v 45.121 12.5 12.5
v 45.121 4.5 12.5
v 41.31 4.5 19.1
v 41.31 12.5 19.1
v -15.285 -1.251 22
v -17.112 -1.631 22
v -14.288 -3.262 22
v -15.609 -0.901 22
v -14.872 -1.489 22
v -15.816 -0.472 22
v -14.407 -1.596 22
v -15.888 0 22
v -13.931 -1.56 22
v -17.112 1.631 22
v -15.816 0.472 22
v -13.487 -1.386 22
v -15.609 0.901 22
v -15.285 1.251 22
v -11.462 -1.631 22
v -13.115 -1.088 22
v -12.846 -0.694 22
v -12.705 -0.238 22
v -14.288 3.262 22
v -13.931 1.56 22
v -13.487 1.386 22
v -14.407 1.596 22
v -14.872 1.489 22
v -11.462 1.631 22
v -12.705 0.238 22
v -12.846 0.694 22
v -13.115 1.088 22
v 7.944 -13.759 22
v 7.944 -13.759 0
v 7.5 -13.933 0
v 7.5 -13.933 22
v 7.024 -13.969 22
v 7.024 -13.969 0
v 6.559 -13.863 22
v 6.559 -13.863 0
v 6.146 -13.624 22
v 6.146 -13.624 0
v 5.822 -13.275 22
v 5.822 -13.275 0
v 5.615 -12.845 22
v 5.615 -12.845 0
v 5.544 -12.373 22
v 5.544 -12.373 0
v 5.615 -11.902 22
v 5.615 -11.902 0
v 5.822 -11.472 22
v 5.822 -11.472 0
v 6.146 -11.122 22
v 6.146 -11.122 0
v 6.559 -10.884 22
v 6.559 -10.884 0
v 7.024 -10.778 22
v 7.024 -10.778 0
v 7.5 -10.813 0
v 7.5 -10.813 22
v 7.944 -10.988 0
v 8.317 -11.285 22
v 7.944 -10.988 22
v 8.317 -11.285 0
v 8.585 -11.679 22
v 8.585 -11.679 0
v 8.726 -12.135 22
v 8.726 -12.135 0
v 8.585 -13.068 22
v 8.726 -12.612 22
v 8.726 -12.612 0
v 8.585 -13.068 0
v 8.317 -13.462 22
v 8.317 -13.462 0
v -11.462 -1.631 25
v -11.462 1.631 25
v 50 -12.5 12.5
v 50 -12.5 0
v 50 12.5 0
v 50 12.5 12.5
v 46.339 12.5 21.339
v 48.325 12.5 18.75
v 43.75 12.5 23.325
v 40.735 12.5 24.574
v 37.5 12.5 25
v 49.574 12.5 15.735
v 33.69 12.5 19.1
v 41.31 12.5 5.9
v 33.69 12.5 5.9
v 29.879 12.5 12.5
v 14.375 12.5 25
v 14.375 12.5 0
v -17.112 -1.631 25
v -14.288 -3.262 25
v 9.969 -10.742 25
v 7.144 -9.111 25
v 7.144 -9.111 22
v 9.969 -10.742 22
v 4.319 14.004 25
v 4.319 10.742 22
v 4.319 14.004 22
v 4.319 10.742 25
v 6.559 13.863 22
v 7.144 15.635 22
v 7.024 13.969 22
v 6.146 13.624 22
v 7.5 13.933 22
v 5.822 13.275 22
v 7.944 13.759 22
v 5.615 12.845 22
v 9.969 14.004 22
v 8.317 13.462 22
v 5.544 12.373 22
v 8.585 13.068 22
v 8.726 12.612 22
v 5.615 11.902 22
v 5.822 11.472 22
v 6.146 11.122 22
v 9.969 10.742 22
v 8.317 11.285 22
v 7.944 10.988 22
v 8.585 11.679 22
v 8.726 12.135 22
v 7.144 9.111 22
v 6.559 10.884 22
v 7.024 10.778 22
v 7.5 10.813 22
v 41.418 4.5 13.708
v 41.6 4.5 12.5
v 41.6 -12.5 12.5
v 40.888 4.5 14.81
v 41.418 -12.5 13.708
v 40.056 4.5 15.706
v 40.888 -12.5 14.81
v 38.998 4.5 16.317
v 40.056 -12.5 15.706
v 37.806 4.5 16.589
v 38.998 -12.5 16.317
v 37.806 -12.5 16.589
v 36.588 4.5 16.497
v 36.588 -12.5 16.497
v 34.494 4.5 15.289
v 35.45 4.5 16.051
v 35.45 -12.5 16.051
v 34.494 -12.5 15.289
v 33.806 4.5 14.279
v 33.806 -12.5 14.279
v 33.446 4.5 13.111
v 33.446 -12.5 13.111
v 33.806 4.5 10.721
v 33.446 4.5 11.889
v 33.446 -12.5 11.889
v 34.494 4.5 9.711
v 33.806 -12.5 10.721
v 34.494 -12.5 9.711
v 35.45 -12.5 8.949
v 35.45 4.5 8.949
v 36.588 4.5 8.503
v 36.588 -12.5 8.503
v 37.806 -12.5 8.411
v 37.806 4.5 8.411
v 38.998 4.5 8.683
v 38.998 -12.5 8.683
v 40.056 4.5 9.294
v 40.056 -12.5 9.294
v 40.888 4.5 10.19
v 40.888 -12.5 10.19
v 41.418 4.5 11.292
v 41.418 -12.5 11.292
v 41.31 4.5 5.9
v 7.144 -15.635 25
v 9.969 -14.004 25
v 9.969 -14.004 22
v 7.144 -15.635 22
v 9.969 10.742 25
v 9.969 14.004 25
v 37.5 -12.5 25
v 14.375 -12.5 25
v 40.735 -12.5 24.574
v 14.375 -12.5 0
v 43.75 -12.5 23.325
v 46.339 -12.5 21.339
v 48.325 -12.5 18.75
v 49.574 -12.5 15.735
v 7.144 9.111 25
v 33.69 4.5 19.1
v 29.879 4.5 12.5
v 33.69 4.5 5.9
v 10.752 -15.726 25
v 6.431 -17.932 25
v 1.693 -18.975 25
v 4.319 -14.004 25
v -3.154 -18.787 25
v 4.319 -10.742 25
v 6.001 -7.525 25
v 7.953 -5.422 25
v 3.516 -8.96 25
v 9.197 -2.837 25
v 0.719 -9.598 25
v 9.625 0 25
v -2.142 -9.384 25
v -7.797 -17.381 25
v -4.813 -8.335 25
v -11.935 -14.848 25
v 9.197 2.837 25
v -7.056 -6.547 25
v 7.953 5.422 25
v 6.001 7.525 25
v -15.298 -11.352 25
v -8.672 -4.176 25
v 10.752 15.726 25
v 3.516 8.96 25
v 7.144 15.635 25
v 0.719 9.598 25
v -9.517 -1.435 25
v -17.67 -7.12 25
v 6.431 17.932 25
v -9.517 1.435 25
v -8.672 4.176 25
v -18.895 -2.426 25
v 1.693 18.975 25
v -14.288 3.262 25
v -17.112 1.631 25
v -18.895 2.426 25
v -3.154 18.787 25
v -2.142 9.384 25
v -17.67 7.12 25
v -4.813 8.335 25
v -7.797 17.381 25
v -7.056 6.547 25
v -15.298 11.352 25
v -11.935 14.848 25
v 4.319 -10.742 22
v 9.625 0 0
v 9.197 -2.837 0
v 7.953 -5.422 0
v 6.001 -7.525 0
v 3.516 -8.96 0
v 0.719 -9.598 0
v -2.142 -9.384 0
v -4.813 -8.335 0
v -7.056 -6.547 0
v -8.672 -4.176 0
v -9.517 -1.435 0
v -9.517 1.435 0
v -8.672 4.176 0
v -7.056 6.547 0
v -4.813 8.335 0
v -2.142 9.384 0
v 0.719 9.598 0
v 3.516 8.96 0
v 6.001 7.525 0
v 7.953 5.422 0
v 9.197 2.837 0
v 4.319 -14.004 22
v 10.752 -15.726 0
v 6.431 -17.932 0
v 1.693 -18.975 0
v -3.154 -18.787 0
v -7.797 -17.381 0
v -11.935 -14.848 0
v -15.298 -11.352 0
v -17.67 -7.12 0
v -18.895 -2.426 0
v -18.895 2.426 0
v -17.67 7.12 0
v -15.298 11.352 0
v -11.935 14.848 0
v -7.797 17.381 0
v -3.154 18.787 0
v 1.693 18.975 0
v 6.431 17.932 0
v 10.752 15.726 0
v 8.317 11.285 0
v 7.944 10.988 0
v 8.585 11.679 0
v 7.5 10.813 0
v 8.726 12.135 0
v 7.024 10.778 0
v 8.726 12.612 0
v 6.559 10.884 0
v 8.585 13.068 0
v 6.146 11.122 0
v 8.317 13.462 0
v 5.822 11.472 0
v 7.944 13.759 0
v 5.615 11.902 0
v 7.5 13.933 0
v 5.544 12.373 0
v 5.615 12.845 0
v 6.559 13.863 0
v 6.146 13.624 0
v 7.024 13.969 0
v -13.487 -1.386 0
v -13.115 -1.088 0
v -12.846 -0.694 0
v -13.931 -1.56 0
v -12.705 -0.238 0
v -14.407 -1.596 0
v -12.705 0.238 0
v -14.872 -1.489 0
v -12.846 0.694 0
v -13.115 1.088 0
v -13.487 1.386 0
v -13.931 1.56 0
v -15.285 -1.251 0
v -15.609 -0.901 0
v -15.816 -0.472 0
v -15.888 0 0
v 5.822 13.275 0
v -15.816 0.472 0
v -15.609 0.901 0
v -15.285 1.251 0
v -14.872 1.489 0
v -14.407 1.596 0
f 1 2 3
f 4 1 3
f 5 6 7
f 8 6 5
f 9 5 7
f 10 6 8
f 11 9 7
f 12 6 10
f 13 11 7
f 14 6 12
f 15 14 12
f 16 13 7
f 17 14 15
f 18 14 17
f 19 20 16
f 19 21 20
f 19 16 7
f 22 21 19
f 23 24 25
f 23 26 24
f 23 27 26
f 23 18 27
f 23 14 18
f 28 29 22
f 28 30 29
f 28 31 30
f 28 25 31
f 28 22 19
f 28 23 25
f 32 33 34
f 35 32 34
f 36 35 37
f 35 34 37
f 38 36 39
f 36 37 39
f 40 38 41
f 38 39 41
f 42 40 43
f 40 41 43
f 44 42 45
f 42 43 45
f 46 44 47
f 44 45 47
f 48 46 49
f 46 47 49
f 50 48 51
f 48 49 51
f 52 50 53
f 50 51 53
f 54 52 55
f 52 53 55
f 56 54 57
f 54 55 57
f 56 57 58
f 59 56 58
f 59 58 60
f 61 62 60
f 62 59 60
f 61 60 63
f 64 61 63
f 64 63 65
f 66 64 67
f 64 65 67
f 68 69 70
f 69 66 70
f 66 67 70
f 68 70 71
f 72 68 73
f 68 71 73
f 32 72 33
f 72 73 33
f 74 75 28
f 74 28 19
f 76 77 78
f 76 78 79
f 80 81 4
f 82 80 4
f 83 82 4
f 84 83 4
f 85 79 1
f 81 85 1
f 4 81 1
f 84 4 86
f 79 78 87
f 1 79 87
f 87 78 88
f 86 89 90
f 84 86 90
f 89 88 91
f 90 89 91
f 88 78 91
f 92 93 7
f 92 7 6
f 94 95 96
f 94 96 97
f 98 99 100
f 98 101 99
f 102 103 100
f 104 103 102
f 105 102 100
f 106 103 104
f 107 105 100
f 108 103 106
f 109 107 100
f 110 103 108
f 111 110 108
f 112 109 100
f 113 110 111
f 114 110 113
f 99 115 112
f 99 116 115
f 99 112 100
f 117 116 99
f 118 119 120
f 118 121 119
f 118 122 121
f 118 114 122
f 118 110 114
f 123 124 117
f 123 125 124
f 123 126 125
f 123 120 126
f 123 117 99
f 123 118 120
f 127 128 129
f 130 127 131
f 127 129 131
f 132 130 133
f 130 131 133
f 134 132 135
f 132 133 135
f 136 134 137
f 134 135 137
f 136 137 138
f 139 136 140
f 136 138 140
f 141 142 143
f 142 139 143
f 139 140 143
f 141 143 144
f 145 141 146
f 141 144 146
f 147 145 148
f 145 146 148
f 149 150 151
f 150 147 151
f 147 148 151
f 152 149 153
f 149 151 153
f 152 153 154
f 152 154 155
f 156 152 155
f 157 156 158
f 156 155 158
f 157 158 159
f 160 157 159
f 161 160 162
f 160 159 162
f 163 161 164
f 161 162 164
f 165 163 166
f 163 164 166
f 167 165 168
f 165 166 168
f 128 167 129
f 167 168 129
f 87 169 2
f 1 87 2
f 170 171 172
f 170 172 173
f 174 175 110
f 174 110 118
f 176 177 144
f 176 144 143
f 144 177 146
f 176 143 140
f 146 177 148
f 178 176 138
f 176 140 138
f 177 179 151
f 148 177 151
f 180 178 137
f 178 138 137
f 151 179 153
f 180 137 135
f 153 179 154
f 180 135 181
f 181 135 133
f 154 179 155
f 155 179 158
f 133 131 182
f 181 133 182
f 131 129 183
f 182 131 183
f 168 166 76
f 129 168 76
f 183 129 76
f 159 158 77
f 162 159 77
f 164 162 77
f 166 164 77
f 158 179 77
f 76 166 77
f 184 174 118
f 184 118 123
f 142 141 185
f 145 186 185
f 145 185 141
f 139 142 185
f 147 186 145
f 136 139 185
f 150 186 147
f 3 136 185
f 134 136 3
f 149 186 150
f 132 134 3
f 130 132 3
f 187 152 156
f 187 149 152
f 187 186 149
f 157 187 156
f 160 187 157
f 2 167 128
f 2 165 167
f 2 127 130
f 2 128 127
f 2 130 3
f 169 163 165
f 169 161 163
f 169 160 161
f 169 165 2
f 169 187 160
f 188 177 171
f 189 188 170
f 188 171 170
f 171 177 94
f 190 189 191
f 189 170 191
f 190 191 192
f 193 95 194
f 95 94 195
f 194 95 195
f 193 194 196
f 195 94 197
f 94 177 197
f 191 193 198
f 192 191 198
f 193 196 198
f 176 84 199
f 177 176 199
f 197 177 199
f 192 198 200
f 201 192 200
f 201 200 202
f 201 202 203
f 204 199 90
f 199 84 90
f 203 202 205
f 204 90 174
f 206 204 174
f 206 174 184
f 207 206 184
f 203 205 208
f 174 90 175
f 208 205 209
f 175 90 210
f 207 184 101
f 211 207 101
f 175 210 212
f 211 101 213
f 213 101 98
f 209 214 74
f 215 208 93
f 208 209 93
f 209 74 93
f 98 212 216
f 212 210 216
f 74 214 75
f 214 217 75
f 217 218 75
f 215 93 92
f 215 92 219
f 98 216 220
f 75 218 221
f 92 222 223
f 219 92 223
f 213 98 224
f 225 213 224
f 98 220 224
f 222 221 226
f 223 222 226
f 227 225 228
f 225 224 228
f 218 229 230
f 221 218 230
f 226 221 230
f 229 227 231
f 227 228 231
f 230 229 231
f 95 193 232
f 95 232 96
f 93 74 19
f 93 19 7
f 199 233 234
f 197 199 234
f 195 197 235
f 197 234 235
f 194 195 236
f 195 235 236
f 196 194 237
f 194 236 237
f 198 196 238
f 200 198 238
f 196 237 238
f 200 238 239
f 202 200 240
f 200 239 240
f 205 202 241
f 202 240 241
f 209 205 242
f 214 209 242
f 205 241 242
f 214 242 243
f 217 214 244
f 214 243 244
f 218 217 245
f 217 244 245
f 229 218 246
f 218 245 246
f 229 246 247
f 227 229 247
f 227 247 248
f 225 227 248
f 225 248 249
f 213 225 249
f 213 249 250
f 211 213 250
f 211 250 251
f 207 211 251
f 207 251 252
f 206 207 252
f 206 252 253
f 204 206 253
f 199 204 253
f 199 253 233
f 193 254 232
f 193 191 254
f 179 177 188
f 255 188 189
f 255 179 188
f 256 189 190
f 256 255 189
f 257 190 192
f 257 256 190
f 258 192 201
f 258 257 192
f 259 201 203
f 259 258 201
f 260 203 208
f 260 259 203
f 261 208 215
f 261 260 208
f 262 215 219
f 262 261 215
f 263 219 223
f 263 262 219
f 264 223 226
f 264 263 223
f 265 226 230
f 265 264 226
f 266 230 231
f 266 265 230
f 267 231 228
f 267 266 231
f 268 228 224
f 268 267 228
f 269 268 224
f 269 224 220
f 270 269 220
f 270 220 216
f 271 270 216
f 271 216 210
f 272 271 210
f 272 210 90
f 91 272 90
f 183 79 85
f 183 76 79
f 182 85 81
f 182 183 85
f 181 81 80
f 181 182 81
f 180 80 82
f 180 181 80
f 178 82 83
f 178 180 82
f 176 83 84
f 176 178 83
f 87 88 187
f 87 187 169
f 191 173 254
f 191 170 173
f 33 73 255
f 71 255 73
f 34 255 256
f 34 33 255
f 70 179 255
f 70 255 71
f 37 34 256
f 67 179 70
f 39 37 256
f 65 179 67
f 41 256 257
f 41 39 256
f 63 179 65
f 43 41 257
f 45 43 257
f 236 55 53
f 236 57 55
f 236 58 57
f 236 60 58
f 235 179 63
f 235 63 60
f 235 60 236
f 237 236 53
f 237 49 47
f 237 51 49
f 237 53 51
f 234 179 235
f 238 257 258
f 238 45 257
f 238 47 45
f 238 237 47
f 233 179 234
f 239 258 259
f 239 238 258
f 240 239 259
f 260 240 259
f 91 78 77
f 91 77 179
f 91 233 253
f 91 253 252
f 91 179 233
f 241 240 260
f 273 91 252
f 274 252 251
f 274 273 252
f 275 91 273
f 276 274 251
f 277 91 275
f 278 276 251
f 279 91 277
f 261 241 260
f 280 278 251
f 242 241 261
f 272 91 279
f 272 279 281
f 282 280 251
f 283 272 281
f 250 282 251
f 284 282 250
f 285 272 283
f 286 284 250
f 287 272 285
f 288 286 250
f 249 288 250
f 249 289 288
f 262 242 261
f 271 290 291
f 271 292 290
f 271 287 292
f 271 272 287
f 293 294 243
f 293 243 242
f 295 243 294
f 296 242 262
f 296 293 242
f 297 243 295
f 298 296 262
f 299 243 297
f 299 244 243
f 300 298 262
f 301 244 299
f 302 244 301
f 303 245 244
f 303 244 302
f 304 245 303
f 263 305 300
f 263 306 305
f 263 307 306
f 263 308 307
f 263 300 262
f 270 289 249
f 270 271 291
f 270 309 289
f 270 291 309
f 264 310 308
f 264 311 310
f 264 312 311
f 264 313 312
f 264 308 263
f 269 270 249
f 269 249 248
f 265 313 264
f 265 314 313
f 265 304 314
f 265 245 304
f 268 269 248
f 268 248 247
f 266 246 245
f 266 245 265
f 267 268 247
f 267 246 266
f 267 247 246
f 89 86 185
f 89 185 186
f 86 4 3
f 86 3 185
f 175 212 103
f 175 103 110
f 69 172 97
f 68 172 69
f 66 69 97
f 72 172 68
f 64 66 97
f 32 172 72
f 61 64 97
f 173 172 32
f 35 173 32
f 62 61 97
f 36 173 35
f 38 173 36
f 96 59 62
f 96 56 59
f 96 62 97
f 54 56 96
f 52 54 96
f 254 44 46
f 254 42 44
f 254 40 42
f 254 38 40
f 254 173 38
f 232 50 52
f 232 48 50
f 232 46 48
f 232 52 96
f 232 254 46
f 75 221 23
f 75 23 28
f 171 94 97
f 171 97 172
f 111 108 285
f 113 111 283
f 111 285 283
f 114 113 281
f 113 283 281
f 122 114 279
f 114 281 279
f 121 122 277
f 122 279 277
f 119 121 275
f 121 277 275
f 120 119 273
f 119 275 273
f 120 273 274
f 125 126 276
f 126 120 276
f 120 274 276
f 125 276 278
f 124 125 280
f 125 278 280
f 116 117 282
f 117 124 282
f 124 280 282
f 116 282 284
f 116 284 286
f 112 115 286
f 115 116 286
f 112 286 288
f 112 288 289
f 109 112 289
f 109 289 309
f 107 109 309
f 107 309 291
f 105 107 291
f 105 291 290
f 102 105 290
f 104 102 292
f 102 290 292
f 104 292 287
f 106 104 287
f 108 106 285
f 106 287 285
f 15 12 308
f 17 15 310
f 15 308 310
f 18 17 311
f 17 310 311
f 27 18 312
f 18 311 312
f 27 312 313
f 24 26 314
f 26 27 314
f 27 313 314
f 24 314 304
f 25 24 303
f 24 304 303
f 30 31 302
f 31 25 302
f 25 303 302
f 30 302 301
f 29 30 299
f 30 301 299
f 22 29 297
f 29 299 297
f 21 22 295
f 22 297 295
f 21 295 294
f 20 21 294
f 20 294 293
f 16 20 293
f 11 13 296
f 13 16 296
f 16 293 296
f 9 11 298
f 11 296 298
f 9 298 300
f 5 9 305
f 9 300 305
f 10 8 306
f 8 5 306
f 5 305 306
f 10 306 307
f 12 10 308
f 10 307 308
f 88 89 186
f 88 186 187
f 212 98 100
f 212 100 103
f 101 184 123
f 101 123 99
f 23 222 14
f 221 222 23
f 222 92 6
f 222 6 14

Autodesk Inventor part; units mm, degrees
ref_plane "YZ Plane" through (0, 0, 0) normal (1, 0, 0) x (0, 1, 0)
ref_plane "XZ Plane" through (0, 0, 0) normal (0, 1, 0) x (-1, 0, 0)
ref_plane "XY Plane" through (0, 0, 0) normal (0, 0, 1) x (1, 0, 0)
sketch "Sketch1" plane through (0, 0, 0) normal (0, 0, 1) x (1, 0, 0)
  circle A0 centre (0, 0) radius 9.625
  arc A1 (0, 12.5) -> (0, -12.5) centre (0, 0) ccw
  line L0 (0, -12.5) -> (37.5, -12.5)
  line L1 (37.5, -12.5) -> (37.5, 12.5)
  line L2 (37.5, 12.5) -> (0, 12.5)
  line L3 (37.5, 0) -> (9.625, 0) construction
  dimension "d0" = 19.25
  dimension "d2" = 25
  dimension "d4" = 37.5
extrude "Extrusion1" add sketch "Sketch1" along normal blind 25
sketch "Sketch2" plane through (0, -12.5, 0) normal (0, -1, 0) x (1, 0, 0)
  line L0 (37.5, 0) -> (37.5, 25) projected
  line L1 (0, 25) -> (37.5, 25) projected
  line L2 (0, 0) -> (0, 25) projected
  line L3 (37.5, 0) -> (50, 0)
  line L4 (50, 0) -> (50, 12.5)
  arc A0 (50, 12.5) -> (37.5, 25) centre (37.5, 12.5) ccw
extrude "Extrusion2" add sketch "Sketch2" against normal up to surface (25 mm away)
sketch "Sketch3" plane through (0, -12.5, 0) normal (0, -1, 0) x (1, 0, 0)
  arc A0 (50, 12.5) -> (37.5, 25) centre (37.5, 12.5) ccw projected
  circle A1 centre (37.5, 12.5) radius 4.1
  dimension "d9" = 8.2
extrude "Extrusion3" cut sketch "Sketch3" against normal through all
sketch "Sketch10" plane through (50, 12.5, 12.5) normal (0, 1, 0) x (1, 0, 0)
  circle A0 centre (-12.5, 0) radius 4.1 projected
  line L0 (-20.121, 0) -> (-16.3105, 6.6)
  line L1 (-16.3105, 6.6) -> (-8.6895, 6.6)
  line L2 (-8.6895, 6.6) -> (-4.879, 0)
  line L3 (-4.879, 0) -> (-8.6895, -6.6)
  line L4 (-8.6895, -6.6) -> (-16.3105, -6.6)
  line L5 (-16.3105, -6.6) -> (-20.121, 0)
  point P0 (-50, 12.5)
  point P1 (-12.5, 6.6)
  dimension "d47" = 13.2
extrude "Extrusion10" cut sketch "Sketch10" against normal blind 8
sketch "Sketch11" plane through (0, 0, 0) normal (0, 0, -1) x (-1, 0, 0)
  circle A0 centre (0, 0) radius 9.625 projected
  arc A1 (0, -12.5) -> (0, 12.5) centre (0, 0) ccw projected
  circle A2 centre (0, 0) radius 19.05
  dimension "d50" = 38.1
extrude "Extrusion11" add sketch "Sketch11" against normal up to surface (25 mm away)
sketch "Sketch12" plane through (0, 0, 0) normal (0, 0, -1) x (-1, 0, 0)
  arc A0 (-14.3754, -12.5) -> (-14.3754, 12.5) centre (0, 0) ccw projected
  circle A1 centre (14.2875, 0) radius 1.6
  dimension "d55" = 14.2875
  dimension "d56" = 3.2
extrude "Extrusion12" cut sketch "Sketch12" against normal through all
sketch "Sketch13" plane through (0, 0, 25) normal (0, 0, 1) x (1, 0, 0)
  circle A0 centre (-14.2875, 0) radius 1.6 projected
  line L0 (-14.2875, 3.262) -> (-11.4625, 1.631)
  line L1 (-11.4625, 1.631) -> (-11.4625, -1.631)
  line L2 (-11.4625, -1.631) -> (-14.2875, -3.262)
  line L3 (-14.2875, -3.262) -> (-17.1125, -1.631)
  line L4 (-17.1125, -1.631) -> (-17.1125, 1.631)
  line L5 (-17.1125, 1.631) -> (-14.2875, 3.262)
  dimension "d59" = 5.65
extrude "Extrusion13" cut sketch "Sketch13" against normal blind 3
pattern_circular "Circular Pattern3" count 3 over 360 about axis through (0, 0, 0) along (0, 0, 1) of "Extrusion13", "Extrusion12"
properties part number "SHOULDER"
